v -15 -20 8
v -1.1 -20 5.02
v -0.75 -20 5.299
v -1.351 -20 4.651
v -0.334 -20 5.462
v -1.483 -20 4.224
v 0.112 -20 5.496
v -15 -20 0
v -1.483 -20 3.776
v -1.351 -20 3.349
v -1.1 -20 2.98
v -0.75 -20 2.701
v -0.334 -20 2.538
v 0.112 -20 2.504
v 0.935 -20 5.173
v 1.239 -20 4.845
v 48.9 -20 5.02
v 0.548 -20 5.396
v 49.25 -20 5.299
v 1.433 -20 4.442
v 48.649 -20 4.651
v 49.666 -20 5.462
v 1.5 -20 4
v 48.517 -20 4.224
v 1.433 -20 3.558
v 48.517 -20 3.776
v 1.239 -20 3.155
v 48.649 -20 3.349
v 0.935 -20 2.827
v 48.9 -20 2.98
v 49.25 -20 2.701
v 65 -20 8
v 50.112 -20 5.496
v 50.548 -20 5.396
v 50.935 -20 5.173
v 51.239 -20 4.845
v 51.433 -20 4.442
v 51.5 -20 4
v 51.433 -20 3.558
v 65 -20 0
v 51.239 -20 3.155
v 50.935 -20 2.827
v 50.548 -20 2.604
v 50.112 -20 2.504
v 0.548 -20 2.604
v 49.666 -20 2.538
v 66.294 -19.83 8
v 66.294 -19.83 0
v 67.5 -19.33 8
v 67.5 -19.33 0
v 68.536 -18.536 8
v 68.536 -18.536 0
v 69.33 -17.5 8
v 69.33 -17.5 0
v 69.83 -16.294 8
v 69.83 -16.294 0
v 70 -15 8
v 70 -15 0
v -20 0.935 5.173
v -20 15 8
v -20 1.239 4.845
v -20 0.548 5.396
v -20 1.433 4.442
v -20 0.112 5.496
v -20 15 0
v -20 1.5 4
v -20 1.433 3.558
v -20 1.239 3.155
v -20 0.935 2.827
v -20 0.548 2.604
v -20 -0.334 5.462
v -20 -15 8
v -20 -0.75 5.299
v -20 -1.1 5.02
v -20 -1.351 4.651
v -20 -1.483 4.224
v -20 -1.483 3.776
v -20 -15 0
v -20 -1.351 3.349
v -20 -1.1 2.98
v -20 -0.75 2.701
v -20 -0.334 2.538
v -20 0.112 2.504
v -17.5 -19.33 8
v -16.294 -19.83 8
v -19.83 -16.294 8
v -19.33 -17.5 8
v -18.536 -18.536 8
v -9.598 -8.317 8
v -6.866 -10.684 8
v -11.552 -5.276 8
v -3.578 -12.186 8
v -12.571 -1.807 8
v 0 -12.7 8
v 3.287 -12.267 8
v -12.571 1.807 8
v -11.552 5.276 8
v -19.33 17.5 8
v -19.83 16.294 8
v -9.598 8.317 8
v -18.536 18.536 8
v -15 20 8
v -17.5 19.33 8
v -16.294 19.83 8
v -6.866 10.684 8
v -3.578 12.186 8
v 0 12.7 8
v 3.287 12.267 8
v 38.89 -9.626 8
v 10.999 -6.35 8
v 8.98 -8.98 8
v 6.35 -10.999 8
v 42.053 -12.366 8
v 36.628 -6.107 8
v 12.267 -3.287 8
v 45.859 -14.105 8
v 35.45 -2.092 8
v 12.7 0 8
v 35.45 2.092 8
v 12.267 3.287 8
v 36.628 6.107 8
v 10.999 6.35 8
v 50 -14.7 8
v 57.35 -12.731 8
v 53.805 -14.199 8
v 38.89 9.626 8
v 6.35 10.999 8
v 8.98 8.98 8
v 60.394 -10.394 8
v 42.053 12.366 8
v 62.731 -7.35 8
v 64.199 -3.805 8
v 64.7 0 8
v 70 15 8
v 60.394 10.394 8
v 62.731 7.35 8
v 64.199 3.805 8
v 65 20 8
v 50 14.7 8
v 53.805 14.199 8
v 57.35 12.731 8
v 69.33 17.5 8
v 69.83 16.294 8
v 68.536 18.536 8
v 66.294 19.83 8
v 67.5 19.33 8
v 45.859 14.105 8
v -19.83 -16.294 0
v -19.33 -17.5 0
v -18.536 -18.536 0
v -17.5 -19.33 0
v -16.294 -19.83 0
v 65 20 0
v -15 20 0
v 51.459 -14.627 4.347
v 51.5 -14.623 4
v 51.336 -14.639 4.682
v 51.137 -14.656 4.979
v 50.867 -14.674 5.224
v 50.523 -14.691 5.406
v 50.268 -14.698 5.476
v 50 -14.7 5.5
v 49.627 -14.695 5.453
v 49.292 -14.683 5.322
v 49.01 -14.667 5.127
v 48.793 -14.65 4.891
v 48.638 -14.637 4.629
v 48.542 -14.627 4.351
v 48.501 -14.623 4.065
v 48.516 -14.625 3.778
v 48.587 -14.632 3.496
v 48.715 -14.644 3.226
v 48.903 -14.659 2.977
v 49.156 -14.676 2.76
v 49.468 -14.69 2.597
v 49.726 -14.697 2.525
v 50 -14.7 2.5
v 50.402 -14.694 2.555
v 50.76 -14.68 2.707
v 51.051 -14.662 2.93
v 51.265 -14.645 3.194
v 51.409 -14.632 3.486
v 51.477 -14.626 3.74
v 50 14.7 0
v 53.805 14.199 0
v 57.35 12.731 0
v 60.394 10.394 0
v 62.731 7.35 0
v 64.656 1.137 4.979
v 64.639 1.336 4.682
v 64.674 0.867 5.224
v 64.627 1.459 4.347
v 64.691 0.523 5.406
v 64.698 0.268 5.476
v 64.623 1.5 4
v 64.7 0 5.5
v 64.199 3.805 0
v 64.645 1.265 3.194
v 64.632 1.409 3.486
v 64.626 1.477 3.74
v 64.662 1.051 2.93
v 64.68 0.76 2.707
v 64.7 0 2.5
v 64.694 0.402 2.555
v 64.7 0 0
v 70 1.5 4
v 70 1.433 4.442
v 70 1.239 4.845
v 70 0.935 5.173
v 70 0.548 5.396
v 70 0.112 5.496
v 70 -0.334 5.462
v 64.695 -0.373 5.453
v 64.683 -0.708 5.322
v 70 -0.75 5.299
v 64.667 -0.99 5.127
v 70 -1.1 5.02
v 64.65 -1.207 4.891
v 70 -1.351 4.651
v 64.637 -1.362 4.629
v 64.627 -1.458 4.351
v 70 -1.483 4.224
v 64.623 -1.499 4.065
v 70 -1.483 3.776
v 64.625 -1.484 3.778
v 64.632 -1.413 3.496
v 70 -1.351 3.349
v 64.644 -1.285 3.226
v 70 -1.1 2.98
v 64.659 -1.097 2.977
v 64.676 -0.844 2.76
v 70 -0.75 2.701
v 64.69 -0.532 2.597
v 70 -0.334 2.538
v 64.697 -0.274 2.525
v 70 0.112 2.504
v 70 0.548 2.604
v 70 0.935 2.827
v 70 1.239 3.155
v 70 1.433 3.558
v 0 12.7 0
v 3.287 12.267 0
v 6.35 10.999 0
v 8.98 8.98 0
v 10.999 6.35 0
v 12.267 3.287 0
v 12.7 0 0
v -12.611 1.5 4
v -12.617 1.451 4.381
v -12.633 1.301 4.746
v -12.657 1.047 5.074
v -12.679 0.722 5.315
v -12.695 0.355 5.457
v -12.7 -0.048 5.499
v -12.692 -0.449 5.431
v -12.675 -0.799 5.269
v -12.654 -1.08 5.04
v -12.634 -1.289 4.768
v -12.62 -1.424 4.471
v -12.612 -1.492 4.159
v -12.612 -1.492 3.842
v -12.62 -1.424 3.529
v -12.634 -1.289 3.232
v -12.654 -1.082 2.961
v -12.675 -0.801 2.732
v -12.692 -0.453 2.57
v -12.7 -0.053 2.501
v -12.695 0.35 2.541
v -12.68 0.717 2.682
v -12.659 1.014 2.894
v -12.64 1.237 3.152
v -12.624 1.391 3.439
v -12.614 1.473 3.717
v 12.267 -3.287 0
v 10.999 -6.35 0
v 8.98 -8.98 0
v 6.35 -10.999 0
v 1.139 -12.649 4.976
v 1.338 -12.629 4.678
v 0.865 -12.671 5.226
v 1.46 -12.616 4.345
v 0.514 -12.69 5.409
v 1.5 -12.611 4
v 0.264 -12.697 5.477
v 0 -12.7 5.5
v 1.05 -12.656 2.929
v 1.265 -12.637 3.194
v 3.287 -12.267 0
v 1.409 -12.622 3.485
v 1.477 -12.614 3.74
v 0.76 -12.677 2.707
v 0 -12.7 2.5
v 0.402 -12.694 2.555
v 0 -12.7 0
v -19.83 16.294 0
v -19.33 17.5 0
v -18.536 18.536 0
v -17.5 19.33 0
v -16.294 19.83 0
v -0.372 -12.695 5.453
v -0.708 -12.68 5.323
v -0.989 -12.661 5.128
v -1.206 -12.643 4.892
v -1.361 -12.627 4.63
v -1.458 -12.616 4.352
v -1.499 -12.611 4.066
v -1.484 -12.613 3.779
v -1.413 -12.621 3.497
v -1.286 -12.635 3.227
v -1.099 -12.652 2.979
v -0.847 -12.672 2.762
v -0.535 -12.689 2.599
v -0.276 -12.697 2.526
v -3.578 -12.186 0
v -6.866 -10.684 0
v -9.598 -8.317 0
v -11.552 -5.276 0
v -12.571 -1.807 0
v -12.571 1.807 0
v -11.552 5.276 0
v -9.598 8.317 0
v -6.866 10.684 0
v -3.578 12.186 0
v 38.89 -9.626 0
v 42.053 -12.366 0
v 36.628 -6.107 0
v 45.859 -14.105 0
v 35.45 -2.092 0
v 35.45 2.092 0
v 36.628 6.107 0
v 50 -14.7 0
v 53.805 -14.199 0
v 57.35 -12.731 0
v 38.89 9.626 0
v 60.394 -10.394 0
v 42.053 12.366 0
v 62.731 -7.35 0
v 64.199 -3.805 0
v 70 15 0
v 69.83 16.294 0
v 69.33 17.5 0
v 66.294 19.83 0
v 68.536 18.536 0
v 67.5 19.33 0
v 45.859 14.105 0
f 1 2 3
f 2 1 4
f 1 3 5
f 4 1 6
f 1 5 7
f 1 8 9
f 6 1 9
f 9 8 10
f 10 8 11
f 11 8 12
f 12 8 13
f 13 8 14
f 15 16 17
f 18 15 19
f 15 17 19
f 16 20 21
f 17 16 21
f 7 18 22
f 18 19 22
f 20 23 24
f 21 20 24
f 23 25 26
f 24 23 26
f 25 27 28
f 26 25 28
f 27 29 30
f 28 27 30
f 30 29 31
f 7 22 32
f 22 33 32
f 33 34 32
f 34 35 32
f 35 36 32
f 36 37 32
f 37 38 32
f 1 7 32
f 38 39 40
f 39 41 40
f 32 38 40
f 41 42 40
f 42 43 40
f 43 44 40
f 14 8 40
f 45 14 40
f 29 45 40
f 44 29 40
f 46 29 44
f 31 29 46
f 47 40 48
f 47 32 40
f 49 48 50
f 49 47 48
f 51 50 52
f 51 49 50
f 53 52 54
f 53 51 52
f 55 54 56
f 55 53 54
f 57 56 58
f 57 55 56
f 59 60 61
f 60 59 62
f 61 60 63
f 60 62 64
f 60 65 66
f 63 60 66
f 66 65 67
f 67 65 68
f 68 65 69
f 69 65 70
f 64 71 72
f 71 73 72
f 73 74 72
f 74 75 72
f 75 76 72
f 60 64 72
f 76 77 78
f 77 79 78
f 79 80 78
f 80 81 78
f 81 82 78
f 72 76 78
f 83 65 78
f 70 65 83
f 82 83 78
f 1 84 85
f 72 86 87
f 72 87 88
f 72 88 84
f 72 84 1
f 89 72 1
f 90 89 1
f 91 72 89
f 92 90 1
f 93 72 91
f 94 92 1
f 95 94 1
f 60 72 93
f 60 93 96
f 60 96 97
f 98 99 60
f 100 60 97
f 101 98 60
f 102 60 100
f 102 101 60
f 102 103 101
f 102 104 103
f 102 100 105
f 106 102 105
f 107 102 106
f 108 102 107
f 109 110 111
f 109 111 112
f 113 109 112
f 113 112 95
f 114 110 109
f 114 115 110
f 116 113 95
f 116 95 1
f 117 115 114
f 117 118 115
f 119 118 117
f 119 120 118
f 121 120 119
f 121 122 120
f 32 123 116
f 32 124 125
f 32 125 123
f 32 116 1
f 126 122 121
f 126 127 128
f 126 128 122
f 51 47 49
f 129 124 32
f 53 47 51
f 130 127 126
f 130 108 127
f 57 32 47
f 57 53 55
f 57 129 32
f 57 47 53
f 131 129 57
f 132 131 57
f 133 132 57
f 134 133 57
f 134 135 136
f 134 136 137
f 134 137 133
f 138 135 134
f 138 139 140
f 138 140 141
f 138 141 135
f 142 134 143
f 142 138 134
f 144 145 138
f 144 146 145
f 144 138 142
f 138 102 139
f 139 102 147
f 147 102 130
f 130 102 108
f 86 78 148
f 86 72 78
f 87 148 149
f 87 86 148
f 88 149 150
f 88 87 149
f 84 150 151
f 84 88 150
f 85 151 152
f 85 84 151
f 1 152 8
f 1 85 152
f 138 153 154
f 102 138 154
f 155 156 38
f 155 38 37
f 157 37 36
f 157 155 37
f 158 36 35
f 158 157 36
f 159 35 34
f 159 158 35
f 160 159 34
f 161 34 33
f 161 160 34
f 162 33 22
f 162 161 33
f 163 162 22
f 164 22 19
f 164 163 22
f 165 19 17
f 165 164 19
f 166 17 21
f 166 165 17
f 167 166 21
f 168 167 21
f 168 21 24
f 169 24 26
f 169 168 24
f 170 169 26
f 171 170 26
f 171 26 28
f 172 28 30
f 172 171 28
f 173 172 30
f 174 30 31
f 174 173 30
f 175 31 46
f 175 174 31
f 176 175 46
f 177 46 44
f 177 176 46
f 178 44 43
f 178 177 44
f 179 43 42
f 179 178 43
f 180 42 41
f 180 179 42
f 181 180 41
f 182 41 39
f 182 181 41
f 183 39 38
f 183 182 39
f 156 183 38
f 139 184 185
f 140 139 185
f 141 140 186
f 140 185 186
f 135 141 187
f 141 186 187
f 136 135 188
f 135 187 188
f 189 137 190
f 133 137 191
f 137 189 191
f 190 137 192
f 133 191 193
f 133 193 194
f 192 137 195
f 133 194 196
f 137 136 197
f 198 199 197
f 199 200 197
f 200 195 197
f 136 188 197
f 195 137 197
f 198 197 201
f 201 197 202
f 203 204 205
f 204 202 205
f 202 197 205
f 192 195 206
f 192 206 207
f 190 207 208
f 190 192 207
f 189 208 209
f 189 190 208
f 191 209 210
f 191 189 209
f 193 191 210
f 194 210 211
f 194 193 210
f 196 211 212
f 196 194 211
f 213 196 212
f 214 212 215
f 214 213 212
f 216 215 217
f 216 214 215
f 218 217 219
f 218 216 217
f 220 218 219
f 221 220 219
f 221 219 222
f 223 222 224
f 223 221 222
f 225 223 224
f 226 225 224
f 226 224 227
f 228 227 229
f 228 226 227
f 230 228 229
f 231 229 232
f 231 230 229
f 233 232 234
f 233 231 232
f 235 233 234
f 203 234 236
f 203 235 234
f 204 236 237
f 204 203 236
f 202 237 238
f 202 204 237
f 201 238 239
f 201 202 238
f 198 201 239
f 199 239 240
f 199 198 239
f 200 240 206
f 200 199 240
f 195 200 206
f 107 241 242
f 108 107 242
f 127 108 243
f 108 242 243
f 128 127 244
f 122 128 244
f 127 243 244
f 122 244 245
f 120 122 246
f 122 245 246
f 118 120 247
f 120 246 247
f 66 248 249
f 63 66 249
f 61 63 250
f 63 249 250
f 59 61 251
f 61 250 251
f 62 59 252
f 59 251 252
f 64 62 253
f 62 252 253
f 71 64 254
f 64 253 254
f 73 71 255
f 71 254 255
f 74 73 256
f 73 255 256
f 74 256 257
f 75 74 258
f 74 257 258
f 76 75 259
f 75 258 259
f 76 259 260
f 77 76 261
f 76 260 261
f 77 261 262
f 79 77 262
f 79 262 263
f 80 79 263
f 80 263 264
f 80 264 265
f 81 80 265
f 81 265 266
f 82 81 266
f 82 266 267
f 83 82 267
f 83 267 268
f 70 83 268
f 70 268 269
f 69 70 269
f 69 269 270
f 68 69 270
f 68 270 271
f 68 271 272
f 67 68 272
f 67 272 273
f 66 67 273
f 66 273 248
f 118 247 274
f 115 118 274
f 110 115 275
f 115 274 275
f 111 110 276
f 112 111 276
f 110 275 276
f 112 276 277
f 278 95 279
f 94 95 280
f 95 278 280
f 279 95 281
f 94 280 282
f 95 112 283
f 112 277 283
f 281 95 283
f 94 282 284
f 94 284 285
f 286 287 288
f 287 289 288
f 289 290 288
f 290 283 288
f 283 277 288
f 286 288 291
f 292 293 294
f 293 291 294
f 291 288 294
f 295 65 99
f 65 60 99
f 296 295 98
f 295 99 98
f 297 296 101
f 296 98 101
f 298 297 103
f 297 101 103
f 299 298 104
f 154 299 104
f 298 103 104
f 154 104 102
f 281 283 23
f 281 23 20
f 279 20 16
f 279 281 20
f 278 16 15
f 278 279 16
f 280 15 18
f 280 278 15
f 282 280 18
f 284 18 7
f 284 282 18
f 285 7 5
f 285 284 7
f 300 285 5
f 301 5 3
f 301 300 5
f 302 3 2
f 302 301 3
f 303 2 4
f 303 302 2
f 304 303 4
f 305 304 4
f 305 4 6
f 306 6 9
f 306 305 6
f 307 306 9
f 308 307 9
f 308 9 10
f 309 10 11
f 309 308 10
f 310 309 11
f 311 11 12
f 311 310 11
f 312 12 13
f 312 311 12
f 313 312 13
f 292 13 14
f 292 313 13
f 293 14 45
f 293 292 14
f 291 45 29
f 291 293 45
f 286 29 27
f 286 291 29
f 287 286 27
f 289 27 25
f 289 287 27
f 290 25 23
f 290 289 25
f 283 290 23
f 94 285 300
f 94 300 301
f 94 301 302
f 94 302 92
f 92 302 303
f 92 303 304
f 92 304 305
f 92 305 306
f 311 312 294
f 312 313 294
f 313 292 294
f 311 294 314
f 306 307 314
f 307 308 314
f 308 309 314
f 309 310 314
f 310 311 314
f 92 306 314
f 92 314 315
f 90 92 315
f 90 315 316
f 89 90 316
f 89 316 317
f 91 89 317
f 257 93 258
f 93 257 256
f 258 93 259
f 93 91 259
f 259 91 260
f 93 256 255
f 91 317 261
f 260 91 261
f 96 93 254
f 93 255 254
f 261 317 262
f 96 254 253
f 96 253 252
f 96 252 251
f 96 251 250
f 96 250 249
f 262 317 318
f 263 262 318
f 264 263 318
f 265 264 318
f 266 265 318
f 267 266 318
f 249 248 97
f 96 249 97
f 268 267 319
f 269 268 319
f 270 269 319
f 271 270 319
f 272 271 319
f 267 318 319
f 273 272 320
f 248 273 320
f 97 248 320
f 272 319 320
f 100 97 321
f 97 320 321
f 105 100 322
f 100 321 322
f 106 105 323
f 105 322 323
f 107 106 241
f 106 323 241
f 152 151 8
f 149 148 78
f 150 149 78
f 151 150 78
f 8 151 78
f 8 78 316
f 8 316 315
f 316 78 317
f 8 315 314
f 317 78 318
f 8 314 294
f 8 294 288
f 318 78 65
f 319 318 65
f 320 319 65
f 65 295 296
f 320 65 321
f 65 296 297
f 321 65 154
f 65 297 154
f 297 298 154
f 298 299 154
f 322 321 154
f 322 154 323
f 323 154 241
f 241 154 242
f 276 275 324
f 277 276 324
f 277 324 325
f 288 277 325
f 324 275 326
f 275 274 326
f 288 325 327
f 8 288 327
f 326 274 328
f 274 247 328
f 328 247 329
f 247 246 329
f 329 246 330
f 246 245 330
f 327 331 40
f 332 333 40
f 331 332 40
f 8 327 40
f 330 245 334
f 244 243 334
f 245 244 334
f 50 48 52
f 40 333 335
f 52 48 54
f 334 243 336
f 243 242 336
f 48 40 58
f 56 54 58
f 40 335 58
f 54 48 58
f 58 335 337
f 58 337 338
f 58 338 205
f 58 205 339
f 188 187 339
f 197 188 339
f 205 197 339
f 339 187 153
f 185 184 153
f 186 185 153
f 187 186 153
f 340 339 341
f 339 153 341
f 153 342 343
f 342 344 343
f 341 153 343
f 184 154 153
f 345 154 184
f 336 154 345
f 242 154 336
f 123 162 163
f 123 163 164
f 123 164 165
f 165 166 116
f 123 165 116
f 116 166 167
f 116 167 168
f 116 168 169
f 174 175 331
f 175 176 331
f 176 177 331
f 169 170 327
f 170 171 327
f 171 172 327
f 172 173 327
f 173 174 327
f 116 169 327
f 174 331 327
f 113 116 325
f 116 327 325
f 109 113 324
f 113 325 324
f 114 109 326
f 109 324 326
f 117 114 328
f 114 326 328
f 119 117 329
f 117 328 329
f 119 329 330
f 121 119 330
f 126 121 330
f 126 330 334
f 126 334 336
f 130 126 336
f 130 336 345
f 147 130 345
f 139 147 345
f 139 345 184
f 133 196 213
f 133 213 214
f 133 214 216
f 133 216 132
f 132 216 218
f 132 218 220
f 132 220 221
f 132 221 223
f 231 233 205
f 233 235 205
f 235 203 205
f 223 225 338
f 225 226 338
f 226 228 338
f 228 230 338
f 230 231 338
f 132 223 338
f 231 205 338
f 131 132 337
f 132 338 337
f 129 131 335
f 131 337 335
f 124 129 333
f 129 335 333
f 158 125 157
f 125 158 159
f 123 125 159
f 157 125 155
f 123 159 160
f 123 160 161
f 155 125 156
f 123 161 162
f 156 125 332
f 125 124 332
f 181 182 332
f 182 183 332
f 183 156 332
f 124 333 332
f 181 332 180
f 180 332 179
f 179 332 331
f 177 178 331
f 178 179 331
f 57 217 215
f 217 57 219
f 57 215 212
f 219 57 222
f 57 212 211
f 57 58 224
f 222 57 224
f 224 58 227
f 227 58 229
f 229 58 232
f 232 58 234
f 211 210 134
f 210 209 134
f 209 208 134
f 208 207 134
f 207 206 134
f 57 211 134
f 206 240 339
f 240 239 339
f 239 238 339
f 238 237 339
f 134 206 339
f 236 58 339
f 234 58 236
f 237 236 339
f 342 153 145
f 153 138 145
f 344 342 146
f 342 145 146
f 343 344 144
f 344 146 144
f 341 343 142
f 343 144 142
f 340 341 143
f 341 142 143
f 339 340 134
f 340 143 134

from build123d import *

# Parameters (mm, degrees)
F1_DEPTH = 8
F2_R     = 1.5
F3_DEPTH = 25
F4_R     = 1.5
F5_DEPTH = 25
F6_START = 54.3
F6_DEPTH = 27.9
F7_R     = 5


with BuildPart() as f1:
    # F0 (on Top) → F1 (new body)
    with BuildSketch(Plane.XY):
        with BuildLine():
            ThreePointArc((0, 12.7), (8.9802561211, 8.9802561211), (12.7, 0))
            ThreePointArc((12.7, 0), (8.9802561211, -8.9802561211), (0, -12.7))
            Line((0, -12.7), (0, -20))
            Line((0, -20), (50, -20))
            Line((50, -20), (50, -14.7))
            ThreePointArc((50, -14.7), (35.3, 0), (50, 14.7))
            Line((50, 14.7), (50, 20))
            Line((50, 20), (0, 20))
            Line((0, 20), (0, 12.7))
        make_face()
        with BuildLine():
            ThreePointArc((0, -12.7), (-12.7, 0), (0, 12.7))
            Line((0, 12.7), (0, 20))
            Line((0, 20), (-20, 20))
            Line((-20, 20), (-20, -20))
            Line((-20, -20), (0, -20))
            Line((0, -20), (0, -12.7))
        make_face()
        with BuildLine():
            Line((70, 20), (50, 20))
            Line((50, 20), (50, 14.7))
            ThreePointArc((50, 14.7), (60.3944696834, 10.3944696834), (64.7, 0))
            ThreePointArc((64.7, 0), (60.3944696834, -10.3944696834), (50, -14.7))
            Line((50, -14.7), (50, -20))
            Line((50, -20), (70, -20))
            Line((70, -20), (70, 20))
        make_face()
    extrude(amount=F1_DEPTH)

    # F2 (on Front) → F3 (cut)
    with BuildSketch(Plane.XZ):
        with Locations((0, 4)):
            Circle(F2_R)
        with Locations((50, 4)):
            Circle(F2_R)
    extrude(amount=F3_DEPTH, mode=Mode.SUBTRACT)

    # F4 (on Right) → F5 (cut)
    with BuildSketch(Plane.YZ):
        with Locations((0, 4)):
            Circle(F4_R)
    extrude(amount=-F5_DEPTH, mode=Mode.SUBTRACT)

    # F4 (on Right) → F6 (cut)
    with BuildSketch(Plane.YZ.offset(F6_START)):
        with Locations((0, 4)):
            Circle(F4_R)
    extrude(amount=F6_DEPTH, mode=Mode.SUBTRACT)

    # F7
    f7_edges = [f1.edges().sort_by_distance(p)[0] for p in [
        (70, 20, 4),
        (70, -20, 4),
        (-20, 20, 4),
        (-20, -20, 4),
    ]]
    fillet(f7_edges, radius=F7_R)


solid = f1.part
